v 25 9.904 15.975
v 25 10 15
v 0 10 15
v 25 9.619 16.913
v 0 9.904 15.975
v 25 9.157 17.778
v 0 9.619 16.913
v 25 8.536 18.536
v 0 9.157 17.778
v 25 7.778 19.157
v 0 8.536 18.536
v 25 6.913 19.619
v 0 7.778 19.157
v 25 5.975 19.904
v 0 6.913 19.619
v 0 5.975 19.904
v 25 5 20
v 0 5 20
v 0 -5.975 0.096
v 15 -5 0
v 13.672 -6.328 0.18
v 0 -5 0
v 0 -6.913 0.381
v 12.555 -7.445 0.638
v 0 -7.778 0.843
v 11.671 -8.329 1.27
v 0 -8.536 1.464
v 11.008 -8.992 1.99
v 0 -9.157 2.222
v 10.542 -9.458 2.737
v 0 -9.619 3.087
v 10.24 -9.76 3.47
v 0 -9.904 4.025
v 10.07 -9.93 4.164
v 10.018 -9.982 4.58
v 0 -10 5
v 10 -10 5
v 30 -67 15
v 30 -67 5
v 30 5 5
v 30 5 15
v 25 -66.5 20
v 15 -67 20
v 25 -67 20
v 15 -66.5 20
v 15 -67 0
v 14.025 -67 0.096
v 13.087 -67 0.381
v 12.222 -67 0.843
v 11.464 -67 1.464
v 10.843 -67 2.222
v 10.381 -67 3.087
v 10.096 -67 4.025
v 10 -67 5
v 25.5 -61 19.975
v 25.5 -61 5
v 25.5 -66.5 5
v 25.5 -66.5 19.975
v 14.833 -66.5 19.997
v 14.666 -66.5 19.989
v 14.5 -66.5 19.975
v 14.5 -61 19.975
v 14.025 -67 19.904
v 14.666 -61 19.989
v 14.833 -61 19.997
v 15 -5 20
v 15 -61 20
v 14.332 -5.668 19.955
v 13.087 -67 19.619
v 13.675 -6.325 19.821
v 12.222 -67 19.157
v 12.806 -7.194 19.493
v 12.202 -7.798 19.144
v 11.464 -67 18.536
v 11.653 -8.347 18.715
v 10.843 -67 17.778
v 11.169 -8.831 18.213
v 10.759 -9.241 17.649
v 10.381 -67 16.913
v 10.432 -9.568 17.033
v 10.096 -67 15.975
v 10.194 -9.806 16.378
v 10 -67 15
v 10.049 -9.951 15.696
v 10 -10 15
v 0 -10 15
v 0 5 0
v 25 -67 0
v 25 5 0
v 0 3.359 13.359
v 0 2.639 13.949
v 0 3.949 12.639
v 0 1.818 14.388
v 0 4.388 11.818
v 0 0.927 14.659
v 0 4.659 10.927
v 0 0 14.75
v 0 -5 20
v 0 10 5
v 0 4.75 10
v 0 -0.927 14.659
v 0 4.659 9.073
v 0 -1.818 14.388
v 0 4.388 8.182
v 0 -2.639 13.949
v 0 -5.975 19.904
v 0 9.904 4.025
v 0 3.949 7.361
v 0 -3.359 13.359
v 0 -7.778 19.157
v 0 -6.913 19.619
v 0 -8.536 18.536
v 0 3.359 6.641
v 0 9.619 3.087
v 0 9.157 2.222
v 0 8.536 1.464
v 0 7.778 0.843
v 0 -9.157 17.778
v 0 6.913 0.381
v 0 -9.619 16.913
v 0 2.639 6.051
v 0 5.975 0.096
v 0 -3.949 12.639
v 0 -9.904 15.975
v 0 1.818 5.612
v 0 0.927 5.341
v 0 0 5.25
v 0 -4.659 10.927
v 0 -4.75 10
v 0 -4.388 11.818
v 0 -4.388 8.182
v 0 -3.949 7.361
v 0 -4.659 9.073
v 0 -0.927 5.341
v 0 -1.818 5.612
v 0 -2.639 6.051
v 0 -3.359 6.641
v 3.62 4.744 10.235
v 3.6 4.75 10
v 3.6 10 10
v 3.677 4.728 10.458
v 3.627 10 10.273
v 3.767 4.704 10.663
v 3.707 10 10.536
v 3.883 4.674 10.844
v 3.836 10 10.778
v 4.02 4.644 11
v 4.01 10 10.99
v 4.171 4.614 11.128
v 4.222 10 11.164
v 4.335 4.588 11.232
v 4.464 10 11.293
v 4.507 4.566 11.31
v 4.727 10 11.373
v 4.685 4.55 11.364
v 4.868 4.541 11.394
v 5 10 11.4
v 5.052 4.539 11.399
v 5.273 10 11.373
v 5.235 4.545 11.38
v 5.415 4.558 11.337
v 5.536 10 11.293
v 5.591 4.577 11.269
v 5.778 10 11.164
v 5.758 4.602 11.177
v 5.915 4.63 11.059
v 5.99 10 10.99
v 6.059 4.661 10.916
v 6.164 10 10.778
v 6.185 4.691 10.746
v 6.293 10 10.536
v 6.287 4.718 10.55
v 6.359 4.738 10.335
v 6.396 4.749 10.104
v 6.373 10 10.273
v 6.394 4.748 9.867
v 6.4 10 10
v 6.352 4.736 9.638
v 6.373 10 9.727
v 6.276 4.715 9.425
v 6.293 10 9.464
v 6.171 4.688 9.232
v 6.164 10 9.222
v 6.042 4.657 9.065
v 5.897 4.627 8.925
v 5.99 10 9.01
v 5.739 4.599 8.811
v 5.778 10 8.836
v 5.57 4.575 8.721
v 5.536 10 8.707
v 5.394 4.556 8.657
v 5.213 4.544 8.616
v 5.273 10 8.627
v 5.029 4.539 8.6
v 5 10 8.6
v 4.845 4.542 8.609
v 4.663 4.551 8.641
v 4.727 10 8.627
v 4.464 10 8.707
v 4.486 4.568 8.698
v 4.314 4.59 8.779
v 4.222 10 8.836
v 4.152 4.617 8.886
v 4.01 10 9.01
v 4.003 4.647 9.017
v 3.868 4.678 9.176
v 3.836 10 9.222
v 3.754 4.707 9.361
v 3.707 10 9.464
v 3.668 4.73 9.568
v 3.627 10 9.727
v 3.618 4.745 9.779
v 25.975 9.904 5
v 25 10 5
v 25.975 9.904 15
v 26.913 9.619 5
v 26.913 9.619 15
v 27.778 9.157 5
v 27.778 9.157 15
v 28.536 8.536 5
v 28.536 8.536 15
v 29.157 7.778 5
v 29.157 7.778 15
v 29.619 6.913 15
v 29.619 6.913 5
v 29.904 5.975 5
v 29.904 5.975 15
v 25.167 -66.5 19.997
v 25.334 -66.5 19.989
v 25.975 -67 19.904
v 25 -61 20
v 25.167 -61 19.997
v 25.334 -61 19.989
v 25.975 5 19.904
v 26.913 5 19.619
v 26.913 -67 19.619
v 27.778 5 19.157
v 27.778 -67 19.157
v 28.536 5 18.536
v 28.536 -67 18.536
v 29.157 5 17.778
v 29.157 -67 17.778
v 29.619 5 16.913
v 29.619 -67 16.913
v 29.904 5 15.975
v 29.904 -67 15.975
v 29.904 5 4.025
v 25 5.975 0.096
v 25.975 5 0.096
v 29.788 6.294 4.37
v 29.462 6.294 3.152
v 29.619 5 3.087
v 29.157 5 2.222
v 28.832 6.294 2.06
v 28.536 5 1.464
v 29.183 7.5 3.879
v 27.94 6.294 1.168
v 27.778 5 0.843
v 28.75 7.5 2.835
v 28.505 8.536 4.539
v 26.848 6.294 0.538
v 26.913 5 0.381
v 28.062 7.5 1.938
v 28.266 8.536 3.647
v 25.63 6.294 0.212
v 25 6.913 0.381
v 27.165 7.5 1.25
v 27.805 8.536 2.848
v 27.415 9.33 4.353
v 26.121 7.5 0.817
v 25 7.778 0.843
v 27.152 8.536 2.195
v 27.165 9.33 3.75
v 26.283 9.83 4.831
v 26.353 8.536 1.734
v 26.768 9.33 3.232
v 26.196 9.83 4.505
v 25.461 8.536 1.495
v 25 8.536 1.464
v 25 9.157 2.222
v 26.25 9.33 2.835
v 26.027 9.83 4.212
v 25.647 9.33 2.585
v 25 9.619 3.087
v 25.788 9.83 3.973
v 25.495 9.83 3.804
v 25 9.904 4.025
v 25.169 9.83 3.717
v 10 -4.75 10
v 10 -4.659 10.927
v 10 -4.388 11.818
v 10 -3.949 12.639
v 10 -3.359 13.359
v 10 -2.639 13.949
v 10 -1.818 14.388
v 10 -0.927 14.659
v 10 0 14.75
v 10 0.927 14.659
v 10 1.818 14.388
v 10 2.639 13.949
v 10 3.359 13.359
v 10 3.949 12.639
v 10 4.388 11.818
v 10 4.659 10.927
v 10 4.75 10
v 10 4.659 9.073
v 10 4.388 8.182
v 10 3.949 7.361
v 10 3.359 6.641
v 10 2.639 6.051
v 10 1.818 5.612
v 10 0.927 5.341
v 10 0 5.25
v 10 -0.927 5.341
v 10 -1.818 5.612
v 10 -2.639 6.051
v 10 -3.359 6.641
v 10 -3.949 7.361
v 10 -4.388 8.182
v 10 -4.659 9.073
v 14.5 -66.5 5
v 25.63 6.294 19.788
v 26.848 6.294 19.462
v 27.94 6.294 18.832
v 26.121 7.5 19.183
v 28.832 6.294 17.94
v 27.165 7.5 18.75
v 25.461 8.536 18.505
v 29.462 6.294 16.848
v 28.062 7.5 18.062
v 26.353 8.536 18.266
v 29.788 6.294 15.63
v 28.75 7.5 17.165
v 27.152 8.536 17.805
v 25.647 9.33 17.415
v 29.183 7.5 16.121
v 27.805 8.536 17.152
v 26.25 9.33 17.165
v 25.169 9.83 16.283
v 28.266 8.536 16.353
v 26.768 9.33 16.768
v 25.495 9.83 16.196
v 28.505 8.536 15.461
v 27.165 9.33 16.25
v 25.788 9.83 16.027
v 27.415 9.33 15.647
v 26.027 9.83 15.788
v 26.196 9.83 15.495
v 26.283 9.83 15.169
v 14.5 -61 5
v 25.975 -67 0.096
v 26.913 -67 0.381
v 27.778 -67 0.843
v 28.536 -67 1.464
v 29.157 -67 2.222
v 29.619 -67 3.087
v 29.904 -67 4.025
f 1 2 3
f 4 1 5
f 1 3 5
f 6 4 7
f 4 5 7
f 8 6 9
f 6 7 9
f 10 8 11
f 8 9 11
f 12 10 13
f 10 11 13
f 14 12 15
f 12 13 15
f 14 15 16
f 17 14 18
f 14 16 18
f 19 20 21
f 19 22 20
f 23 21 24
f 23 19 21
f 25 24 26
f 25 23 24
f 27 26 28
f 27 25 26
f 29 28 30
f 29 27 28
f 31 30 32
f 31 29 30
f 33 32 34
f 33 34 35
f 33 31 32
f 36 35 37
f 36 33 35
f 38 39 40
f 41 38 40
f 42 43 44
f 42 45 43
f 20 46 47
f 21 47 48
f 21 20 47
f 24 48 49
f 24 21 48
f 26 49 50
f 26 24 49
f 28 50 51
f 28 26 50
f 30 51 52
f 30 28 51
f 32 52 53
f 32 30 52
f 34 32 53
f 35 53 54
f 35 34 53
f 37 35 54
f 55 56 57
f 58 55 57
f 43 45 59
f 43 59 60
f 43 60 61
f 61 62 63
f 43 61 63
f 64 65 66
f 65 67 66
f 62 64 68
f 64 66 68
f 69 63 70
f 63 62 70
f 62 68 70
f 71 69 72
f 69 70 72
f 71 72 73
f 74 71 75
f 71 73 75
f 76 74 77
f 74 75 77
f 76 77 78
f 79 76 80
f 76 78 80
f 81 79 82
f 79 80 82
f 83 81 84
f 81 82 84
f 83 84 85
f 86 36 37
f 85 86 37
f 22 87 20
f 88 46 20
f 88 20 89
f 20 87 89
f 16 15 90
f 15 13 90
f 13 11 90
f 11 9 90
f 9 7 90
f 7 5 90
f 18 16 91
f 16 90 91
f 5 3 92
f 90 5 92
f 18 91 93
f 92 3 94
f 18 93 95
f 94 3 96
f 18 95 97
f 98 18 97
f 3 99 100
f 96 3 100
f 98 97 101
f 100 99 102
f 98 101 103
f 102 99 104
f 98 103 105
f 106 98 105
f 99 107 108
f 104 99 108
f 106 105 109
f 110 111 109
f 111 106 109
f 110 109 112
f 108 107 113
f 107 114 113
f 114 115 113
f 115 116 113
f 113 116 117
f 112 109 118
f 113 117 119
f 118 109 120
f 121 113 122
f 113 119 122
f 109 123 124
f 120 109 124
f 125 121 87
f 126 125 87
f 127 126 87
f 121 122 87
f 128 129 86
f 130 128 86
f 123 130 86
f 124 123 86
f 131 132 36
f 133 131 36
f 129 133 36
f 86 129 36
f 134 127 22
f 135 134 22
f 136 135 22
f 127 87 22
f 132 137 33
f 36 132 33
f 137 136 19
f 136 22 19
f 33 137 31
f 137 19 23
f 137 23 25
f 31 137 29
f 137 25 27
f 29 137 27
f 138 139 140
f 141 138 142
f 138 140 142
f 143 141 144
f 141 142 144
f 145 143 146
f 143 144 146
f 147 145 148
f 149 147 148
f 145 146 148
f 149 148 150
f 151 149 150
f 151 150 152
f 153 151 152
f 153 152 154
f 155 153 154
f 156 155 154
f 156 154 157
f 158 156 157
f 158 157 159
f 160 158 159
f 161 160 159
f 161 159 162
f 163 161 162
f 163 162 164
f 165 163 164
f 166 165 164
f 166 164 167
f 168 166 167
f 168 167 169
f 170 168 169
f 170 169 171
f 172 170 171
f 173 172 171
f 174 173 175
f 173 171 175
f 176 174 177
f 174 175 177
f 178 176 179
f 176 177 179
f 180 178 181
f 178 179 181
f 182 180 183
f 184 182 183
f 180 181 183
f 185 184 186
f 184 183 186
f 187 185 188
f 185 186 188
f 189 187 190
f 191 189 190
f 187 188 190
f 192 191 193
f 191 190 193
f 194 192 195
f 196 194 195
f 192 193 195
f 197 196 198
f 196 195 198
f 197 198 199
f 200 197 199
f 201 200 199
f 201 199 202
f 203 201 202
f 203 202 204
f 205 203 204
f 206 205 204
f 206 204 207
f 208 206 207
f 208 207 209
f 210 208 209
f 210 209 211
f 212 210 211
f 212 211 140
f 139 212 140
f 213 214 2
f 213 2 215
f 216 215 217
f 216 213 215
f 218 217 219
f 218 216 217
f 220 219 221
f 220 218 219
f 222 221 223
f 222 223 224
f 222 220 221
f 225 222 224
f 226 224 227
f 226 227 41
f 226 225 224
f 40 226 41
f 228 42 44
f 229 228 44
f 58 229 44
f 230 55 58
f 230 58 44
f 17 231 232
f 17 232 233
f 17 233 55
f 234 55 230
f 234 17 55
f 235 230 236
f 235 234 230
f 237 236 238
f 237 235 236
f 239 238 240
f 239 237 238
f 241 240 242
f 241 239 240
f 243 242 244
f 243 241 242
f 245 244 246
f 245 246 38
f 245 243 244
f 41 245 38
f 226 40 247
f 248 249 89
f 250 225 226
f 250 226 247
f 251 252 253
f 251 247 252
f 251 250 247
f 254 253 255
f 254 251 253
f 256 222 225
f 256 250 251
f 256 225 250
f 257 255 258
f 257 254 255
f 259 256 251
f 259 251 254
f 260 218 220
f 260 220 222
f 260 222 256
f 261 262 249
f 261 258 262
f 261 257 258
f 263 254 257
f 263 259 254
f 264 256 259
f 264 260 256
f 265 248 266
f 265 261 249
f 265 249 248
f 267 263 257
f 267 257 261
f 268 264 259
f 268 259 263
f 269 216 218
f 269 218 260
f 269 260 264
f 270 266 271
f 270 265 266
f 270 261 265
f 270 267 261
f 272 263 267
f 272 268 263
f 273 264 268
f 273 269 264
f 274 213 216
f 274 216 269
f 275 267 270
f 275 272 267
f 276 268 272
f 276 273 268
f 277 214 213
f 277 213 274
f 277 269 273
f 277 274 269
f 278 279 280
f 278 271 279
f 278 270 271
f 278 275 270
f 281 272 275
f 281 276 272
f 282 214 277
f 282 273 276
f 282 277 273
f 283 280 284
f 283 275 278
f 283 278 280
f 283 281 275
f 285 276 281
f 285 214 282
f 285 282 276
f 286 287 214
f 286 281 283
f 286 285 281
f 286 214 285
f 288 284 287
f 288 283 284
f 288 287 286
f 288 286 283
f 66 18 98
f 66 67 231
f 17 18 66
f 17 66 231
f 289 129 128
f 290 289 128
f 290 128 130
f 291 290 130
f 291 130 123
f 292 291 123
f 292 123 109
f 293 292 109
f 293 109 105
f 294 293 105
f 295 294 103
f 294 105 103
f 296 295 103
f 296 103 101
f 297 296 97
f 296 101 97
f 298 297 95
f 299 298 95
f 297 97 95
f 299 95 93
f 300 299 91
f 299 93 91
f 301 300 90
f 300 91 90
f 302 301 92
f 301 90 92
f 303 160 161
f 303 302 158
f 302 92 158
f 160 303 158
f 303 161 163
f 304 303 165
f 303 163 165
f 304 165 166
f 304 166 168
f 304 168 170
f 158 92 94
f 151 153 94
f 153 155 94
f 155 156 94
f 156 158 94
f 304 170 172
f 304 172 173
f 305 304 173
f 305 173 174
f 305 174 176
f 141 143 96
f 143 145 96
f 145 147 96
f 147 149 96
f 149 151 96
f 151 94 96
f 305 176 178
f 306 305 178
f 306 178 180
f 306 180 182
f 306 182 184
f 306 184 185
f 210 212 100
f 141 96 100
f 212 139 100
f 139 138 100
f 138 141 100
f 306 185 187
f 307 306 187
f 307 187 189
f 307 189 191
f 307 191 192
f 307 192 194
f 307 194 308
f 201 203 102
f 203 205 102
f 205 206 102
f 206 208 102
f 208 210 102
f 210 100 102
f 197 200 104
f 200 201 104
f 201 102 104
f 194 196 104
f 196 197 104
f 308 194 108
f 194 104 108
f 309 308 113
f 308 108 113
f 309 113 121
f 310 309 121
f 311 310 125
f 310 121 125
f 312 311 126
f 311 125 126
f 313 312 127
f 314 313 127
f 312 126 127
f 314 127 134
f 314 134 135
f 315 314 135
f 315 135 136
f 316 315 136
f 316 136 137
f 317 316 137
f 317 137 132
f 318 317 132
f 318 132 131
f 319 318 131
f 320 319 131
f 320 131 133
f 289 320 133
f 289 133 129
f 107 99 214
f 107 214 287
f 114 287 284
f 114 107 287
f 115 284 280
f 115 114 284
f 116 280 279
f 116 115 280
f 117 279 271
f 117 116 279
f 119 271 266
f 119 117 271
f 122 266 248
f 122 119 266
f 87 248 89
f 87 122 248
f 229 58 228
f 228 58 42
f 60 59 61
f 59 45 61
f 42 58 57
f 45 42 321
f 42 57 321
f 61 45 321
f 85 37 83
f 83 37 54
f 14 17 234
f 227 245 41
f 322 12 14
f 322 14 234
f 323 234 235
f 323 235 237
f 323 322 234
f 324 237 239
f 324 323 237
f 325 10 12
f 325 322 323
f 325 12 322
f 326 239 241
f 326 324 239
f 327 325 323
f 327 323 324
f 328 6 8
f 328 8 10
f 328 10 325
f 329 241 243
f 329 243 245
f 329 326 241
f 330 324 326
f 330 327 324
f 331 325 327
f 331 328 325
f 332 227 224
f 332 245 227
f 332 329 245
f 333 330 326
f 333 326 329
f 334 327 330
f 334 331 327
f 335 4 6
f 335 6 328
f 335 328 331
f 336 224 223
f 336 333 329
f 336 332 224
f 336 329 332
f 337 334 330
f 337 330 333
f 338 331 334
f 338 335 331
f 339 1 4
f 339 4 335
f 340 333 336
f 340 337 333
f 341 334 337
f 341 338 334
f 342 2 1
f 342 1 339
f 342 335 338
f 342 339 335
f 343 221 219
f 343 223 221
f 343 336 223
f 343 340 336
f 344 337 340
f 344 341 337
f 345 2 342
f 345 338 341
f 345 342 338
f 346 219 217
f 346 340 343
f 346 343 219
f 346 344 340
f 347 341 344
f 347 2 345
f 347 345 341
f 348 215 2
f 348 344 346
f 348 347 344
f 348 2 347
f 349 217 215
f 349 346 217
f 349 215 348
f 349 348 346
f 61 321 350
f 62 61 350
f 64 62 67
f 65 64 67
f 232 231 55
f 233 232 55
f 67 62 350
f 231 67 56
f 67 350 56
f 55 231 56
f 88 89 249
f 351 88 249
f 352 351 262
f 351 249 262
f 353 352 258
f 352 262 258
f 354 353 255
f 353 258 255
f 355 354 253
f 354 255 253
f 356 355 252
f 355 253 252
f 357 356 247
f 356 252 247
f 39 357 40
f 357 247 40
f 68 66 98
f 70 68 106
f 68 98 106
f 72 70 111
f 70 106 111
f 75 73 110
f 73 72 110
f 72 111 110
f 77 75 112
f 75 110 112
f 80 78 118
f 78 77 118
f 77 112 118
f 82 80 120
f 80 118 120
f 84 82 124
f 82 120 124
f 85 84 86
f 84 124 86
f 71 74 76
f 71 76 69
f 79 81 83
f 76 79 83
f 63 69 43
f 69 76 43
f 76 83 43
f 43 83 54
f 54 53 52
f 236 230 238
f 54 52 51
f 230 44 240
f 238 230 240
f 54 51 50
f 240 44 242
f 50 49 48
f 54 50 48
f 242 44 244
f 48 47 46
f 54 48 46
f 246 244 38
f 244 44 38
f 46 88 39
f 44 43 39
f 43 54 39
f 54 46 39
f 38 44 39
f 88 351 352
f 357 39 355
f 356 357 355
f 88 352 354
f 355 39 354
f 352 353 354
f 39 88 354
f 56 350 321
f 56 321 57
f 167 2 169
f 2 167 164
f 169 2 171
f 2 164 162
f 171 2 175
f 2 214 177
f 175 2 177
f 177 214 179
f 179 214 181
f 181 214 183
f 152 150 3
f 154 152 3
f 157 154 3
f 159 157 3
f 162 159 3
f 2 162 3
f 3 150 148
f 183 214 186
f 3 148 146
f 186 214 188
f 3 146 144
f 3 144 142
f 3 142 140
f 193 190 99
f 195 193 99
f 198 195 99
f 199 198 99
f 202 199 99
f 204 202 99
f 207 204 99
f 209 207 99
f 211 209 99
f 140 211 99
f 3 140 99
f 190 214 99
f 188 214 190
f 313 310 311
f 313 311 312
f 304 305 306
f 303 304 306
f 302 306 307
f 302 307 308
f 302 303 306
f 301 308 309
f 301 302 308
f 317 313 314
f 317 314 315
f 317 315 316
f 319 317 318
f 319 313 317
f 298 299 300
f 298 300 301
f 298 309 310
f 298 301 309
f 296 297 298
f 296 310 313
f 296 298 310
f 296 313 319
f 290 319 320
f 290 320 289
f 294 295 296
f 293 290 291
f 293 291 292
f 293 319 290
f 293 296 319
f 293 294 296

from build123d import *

# Parameters (mm, degrees)
F1_DEPTH     = 20
F2_DEPTH     = 5
F3_R         = 4.75
F4_DEPTH     = 10
F5_R         = 1.4
F6_DEPTH     = 5.4620024133
F7_T1_DEPTH  = 37.5
F7_T3_DEPTH  = 22.5
F7_T5_DEPTH  = 69.5
F7_T7_DEPTH  = 84.5
F7_T9_DEPTH  = 10
F7_S13_W     = 5
F7_S13_H     = 5
F7_T14_DEPTH = 5
F7_S19_W     = 5
F7_S19_H     = 5
F7_T20_DEPTH = 5
F7_T27_DEPTH = 35
F7_T31_DEPTH = 82
F7_T38_DEPTH = 35
F7_T42_DEPTH = 82


# Not quite as in the source:
# - a fillet or chamfer that OpenCascade refuses, or shapes differently, is made with other operations: its cross-section is extruded or revolved along the edge and cut away or added


with BuildPart() as f1:
    # F0 (on Top) → F1 (new body)
    with BuildSketch(Plane.XY):
        Polygon((0, 10), (0, 0), (0, -10), (10, -10), (10, -67), (30, -67), (30, 10), align=None)
        Polygon((25.5, -61), (25.5, -66.5), (20, -66.5), (14.5, -66.5), (14.5, -61), align=None, mode=Mode.SUBTRACT)
    extrude(amount=F1_DEPTH)

    # F0 (on Top) → F2 (join)
    with BuildSketch(Plane.XY):
        Polygon((20, -66.5), (25.5, -66.5), (25.5, -61), (14.5, -61), (14.5, -66.5), align=None)
    extrude(amount=F2_DEPTH)

    # F3 (on face) → F4 (cut)
    with BuildSketch(Plane(origin=(0, 0, 0), x_dir=(0, -1, 0), z_dir=(-1, 0, 0))):
        with Locations((0, 10)):
            Circle(F3_R)
    extrude(amount=-F4_DEPTH, mode=Mode.SUBTRACT)

    # F5 (on face) → F6 (cut, through all)
    with BuildSketch(Plane(origin=(0, 10, 0), x_dir=(-1, 0, 0), z_dir=(0, 1, 0))):
        with Locations((-5, 10)):
            Circle(F5_R)
    extrude(amount=-F6_DEPTH, mode=Mode.SUBTRACT)

    # F7: fillet of radius 5 on 9 edges, made by hand

    # F7_s2 → F7_t1 (cut)
    with BuildSketch(Plane.YZ.offset(-12.5)):
        with BuildLine():
            ThreePointArc((10, 15), (8.5355339059, 18.5355339059), (5, 20))
            Line((5, 20), (10, 20))
            Line((10, 20), (10, 15))
        make_face()
        with BuildLine():
            ThreePointArc((10, 5), (8.5355339059, 1.4644660941), (5, 0))
            Line((5, 0), (10, 0))
            Line((10, 0), (10, 5))
        make_face()
    extrude(amount=F7_T1_DEPTH, mode=Mode.SUBTRACT)

    # F7_s4 → F7_t3 (cut)
    with BuildSketch(Plane.YZ.offset(-12.5)):
        with BuildLine():
            ThreePointArc((-5, 20), (-8.5355339059, 18.5355339059), (-10, 15))
            Line((-10, 15), (-10, 20))
            Line((-10, 20), (-5, 20))
        make_face()
        with BuildLine():
            ThreePointArc((-5, 0), (-8.5355339059, 1.4644660941), (-10, 5))
            Line((-10, 5), (-10, 0))
            Line((-10, 0), (-5, 0))
        make_face()
    extrude(amount=F7_T3_DEPTH, mode=Mode.SUBTRACT)

    # F7_s6 → F7_t5 (cut)
    with BuildSketch(Plane.XZ.offset(10)):
        with BuildLine():
            ThreePointArc((15, 20), (11.4644660941, 18.5355339059), (10, 15))
            Line((10, 15), (10, 20))
            Line((10, 20), (15, 20))
        make_face()
        with BuildLine():
            ThreePointArc((15, 0), (11.4644660941, 1.4644660941), (10, 5))
            Line((10, 5), (10, 0))
            Line((10, 0), (15, 0))
        make_face()
    extrude(amount=F7_T5_DEPTH, mode=Mode.SUBTRACT)

    # F7_s8 → F7_t7 (cut)
    with BuildSketch(Plane.XZ.offset(-5)):
        with BuildLine():
            ThreePointArc((25, 20), (28.5355339059, 18.5355339059), (30, 15))
            Line((30, 15), (30, 20))
            Line((30, 20), (25, 20))
        make_face()
        with BuildLine():
            ThreePointArc((25, 0), (28.5355339059, 1.4644660941), (30, 5))
            Line((30, 5), (30, 0))
            Line((30, 0), (25, 0))
        make_face()
    extrude(amount=F7_T7_DEPTH, mode=Mode.SUBTRACT)

    # F7_s10 → F7_t9 (cut)
    with BuildSketch(Plane.XY.offset(5)):
        with BuildLine():
            ThreePointArc((25, 10), (28.5355339059, 8.5355339059), (30, 5))
            Line((30, 5), (30, 10))
            Line((30, 10), (25, 10))
        make_face()
    extrude(amount=F7_T9_DEPTH, mode=Mode.SUBTRACT)


with BuildPart() as f7_tool12:
    # F7_s13 → F7_t14 (new body)
    with BuildSketch(Plane.XZ.offset(-5)):
        with Locations((27.5, 17.5)):
            Rectangle(F7_S13_W, F7_S13_H)
    extrude(amount=-F7_T14_DEPTH)

    # F7_s15 → F7_t16 (revolve, cut)
    with BuildSketch(Plane(origin=(25, 5, 15), x_dir=(-0.7071067812, 0, -0.7071067812), z_dir=(0.7071067812, 0, -0.7071067812))):
        with BuildLine():
            ThreePointArc((0, -5), (5, 0), (0, 5))
            Line((0, 5), (0, -5))
        make_face()
    revolve(axis=Axis((25, 5, 15), (0, 1, 0)), mode=Mode.SUBTRACT)


with BuildPart() as f1_1:
    add(f1.part)

    # F7_t11: cut F7_tool12
    add(f7_tool12.part, mode=Mode.SUBTRACT)


with BuildPart() as f7_tool18:
    # F7_s19 → F7_t20 (new body)
    with BuildSketch(Plane.XZ.offset(-5)):
        with Locations((27.5, 2.5)):
            Rectangle(F7_S19_W, F7_S19_H)
    extrude(amount=-F7_T20_DEPTH)

    # F7_s21 → F7_t22 (revolve, cut)
    with BuildSketch(Plane(origin=(25, 5, 5), x_dir=(-0.7071067812, 0, 0.7071067812), z_dir=(-0.7071067812, 0, -0.7071067812))):
        with BuildLine():
            ThreePointArc((0, -5), (5, 0), (0, 5))
            Line((0, 5), (0, -5))
        make_face()
    revolve(axis=Axis((25, 5, 5), (0, 1, 0)), mode=Mode.SUBTRACT)


with BuildPart() as f1_2:
    add(f1_1.part)

    # F7_t17: cut F7_tool18
    add(f7_tool18.part, mode=Mode.SUBTRACT)


with BuildPart() as f7_tool25:
    # F7_s26 → F7_t27 (new body)
    with BuildSketch(Plane.YZ.offset(-12.5)):
        with BuildLine():
            ThreePointArc((-5, 20), (-8.5355339059, 18.5355339059), (-10, 15))
            Line((-10, 15), (-10, 20))
            Line((-10, 20), (-5, 20))
        make_face()
    extrude(amount=F7_T27_DEPTH)

    split(bisect_by=Plane.YZ.offset(10), keep=Keep.TOP)


with BuildPart() as f7_tool29:
    # F7_s30 → F7_t31 (new body)
    with BuildSketch(Plane.XZ.offset(-2.5)):
        with BuildLine():
            ThreePointArc((15, 20), (11.4644660941, 18.5355339059), (10, 15))
            Line((10, 15), (10, 20))
            Line((10, 20), (15, 20))
        make_face()
    extrude(amount=F7_T31_DEPTH)

    split(bisect_by=Plane.XZ.offset(10), keep=Keep.BOTTOM)


with BuildPart() as f7_tool25_1:
    add(f7_tool25.part)

    # F7_t33: intersect F7_tool29
    add(f7_tool29.part, mode=Mode.INTERSECT)


with BuildPart() as f1_3:
    add(f1_2.part)

    # F7_t23: cut F7_tool25
    add(f7_tool25_1.part, mode=Mode.SUBTRACT)


with BuildPart() as f7_tool36:
    # F7_s37 → F7_t38 (new body)
    with BuildSketch(Plane.YZ.offset(-12.5)):
        with BuildLine():
            ThreePointArc((-5, 0), (-8.5355339059, 1.4644660941), (-10, 5))
            Line((-10, 5), (-10, 0))
            Line((-10, 0), (-5, 0))
        make_face()
    extrude(amount=F7_T38_DEPTH)

    split(bisect_by=Plane.YZ.offset(10), keep=Keep.TOP)


with BuildPart() as f7_tool40:
    # F7_s41 → F7_t42 (new body)
    with BuildSketch(Plane.XZ.offset(-2.5)):
        with BuildLine():
            ThreePointArc((15, 0), (11.4644660941, 1.4644660941), (10, 5))
            Line((10, 5), (10, 0))
            Line((10, 0), (15, 0))
        make_face()
    extrude(amount=F7_T42_DEPTH)

    split(bisect_by=Plane.XZ.offset(10), keep=Keep.BOTTOM)


with BuildPart() as f7_tool36_1:
    add(f7_tool36.part)

    # F7_t44: intersect F7_tool40
    add(f7_tool40.part, mode=Mode.INTERSECT)


with BuildPart() as f1_4:
    add(f1_3.part)

    # F7_t34: cut F7_tool36
    add(f7_tool36_1.part, mode=Mode.SUBTRACT)


solid = f1_4.part
